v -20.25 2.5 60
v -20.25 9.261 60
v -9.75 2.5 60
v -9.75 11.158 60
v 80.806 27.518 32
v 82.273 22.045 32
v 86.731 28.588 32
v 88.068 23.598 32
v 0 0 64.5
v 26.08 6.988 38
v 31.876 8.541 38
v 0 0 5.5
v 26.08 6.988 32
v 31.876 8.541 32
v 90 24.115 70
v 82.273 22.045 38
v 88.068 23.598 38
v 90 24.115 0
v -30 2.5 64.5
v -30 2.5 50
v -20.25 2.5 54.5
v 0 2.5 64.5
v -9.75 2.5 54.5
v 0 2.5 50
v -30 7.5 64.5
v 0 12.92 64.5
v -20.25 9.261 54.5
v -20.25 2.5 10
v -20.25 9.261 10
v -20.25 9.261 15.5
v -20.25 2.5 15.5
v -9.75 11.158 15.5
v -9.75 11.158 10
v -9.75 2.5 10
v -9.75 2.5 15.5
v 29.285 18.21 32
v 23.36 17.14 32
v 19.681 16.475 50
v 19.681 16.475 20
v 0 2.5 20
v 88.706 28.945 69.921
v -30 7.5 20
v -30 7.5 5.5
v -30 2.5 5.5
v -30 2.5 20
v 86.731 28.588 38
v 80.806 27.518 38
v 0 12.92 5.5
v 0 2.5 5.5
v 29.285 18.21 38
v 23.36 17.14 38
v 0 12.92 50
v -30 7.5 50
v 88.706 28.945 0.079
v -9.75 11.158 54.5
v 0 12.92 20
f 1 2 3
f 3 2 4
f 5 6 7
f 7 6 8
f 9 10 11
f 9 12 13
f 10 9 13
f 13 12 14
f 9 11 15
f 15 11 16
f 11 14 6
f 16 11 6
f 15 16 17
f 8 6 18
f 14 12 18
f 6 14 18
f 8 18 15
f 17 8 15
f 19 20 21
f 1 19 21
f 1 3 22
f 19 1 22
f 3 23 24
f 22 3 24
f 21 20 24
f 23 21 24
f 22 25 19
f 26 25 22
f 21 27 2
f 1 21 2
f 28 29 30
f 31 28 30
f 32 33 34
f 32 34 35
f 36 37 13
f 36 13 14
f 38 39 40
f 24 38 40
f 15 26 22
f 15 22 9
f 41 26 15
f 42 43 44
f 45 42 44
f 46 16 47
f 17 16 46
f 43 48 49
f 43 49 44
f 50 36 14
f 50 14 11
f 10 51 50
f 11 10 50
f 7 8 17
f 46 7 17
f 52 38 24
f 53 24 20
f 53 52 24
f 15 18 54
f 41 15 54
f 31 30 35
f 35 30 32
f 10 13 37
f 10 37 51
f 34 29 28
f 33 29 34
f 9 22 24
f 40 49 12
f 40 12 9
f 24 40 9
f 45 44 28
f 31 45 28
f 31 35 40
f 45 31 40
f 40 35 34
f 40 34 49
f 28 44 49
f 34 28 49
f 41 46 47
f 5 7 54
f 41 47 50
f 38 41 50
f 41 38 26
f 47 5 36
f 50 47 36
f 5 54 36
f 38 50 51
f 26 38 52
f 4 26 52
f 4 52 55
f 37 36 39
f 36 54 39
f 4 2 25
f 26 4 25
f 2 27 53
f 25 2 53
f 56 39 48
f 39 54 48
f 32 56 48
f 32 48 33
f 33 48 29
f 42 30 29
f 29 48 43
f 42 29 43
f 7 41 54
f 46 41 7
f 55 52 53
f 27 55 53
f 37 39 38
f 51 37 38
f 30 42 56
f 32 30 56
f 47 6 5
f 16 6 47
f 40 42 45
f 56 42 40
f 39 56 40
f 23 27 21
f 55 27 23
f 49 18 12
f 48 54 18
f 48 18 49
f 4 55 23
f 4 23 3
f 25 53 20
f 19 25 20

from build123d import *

# Parameters (mm, degrees)
SALIENTE_EXTRUIR1_DEPTH    = 70
CORTAR_EXTRUIR1_DEPTH      = 118.04418401
CORTAR_EXTRUIR1_DEPTH_BACK = 118.04418401
CROQUIS2_W                 = 30
CROQUIS2_H                 = 30
CROQUIS2_W_2               = 10.5
CROQUIS2_H_2               = 5.5
CROQUIS3_W                 = 6
CROQUIS3_H                 = 6
CORTAR_EXTRUIR2_DEPTH      = 118.634247959
CORTAR_EXTRUIR3_DEPTH      = 15
CORTAR_EXTRUIR3_DEPTH_BACK = 15


with BuildPart() as part:
    # Croquis1 → Saliente-Extruir1 (new body)
    with BuildSketch(Plane.XY):
        Polygon((0, 0), (90, 24.115427319), (88.705904774, 28.94505645), (-30, 7.5), (-30, 2.5), (0, 2.5), align=None)
    extrude(amount=SALIENTE_EXTRUIR1_DEPTH)

    # Croquis2 → Cortar-Extruir1 (cut, two sides: drawn at the far end of the back side and taken through both)
    with BuildSketch(Plane.XZ.offset(-2.5).offset(-CORTAR_EXTRUIR1_DEPTH_BACK)):
        Polygon((-30, 70), (-30, 64.5), (0, 64.5), (90, 70), align=None)
        with Locations((-15, 35)):
            Rectangle(CROQUIS2_W, CROQUIS2_H)
        Polygon((0, 5.5), (-30, 5.5), (-30, 0), (90, 0), align=None)
        with Locations((-15, 12.75)):
            Rectangle(CROQUIS2_W_2, CROQUIS2_H_2)
        with Locations((-15, 57.25)):
            Rectangle(CROQUIS2_W_2, CROQUIS2_H_2)
    extrude(amount=CORTAR_EXTRUIR1_DEPTH + CORTAR_EXTRUIR1_DEPTH_BACK, mode=Mode.SUBTRACT)

    # Croquis3 → Cortar-Extruir2 (cut, through all)
    with BuildSketch(Plane(origin=(0, 0, 0), x_dir=(0.9659258262890692, 0.2588190451025179, 0), z_dir=(0.2588190451025179, -0.9659258262890692, 0))):
        with Locations((30, 35)):
            Rectangle(CROQUIS3_W, CROQUIS3_H)
        with Locations((88.174856237, 35)):
            Rectangle(CROQUIS3_W, CROQUIS3_H)
    extrude(amount=-CORTAR_EXTRUIR2_DEPTH, mode=Mode.SUBTRACT)

    # Croquis4 → Cortar-Extruir3 (cut, two sides: drawn at the far end of the back side and taken through both)
    with BuildSketch(Plane.XY.offset(35).offset(-CORTAR_EXTRUIR3_DEPTH_BACK)):
        Polygon((0, 2.5), (0, 12.919710963), (19.681407906, 16.475295703), align=None)
    extrude(amount=CORTAR_EXTRUIR3_DEPTH + CORTAR_EXTRUIR3_DEPTH_BACK, mode=Mode.SUBTRACT)


solid = part.part
